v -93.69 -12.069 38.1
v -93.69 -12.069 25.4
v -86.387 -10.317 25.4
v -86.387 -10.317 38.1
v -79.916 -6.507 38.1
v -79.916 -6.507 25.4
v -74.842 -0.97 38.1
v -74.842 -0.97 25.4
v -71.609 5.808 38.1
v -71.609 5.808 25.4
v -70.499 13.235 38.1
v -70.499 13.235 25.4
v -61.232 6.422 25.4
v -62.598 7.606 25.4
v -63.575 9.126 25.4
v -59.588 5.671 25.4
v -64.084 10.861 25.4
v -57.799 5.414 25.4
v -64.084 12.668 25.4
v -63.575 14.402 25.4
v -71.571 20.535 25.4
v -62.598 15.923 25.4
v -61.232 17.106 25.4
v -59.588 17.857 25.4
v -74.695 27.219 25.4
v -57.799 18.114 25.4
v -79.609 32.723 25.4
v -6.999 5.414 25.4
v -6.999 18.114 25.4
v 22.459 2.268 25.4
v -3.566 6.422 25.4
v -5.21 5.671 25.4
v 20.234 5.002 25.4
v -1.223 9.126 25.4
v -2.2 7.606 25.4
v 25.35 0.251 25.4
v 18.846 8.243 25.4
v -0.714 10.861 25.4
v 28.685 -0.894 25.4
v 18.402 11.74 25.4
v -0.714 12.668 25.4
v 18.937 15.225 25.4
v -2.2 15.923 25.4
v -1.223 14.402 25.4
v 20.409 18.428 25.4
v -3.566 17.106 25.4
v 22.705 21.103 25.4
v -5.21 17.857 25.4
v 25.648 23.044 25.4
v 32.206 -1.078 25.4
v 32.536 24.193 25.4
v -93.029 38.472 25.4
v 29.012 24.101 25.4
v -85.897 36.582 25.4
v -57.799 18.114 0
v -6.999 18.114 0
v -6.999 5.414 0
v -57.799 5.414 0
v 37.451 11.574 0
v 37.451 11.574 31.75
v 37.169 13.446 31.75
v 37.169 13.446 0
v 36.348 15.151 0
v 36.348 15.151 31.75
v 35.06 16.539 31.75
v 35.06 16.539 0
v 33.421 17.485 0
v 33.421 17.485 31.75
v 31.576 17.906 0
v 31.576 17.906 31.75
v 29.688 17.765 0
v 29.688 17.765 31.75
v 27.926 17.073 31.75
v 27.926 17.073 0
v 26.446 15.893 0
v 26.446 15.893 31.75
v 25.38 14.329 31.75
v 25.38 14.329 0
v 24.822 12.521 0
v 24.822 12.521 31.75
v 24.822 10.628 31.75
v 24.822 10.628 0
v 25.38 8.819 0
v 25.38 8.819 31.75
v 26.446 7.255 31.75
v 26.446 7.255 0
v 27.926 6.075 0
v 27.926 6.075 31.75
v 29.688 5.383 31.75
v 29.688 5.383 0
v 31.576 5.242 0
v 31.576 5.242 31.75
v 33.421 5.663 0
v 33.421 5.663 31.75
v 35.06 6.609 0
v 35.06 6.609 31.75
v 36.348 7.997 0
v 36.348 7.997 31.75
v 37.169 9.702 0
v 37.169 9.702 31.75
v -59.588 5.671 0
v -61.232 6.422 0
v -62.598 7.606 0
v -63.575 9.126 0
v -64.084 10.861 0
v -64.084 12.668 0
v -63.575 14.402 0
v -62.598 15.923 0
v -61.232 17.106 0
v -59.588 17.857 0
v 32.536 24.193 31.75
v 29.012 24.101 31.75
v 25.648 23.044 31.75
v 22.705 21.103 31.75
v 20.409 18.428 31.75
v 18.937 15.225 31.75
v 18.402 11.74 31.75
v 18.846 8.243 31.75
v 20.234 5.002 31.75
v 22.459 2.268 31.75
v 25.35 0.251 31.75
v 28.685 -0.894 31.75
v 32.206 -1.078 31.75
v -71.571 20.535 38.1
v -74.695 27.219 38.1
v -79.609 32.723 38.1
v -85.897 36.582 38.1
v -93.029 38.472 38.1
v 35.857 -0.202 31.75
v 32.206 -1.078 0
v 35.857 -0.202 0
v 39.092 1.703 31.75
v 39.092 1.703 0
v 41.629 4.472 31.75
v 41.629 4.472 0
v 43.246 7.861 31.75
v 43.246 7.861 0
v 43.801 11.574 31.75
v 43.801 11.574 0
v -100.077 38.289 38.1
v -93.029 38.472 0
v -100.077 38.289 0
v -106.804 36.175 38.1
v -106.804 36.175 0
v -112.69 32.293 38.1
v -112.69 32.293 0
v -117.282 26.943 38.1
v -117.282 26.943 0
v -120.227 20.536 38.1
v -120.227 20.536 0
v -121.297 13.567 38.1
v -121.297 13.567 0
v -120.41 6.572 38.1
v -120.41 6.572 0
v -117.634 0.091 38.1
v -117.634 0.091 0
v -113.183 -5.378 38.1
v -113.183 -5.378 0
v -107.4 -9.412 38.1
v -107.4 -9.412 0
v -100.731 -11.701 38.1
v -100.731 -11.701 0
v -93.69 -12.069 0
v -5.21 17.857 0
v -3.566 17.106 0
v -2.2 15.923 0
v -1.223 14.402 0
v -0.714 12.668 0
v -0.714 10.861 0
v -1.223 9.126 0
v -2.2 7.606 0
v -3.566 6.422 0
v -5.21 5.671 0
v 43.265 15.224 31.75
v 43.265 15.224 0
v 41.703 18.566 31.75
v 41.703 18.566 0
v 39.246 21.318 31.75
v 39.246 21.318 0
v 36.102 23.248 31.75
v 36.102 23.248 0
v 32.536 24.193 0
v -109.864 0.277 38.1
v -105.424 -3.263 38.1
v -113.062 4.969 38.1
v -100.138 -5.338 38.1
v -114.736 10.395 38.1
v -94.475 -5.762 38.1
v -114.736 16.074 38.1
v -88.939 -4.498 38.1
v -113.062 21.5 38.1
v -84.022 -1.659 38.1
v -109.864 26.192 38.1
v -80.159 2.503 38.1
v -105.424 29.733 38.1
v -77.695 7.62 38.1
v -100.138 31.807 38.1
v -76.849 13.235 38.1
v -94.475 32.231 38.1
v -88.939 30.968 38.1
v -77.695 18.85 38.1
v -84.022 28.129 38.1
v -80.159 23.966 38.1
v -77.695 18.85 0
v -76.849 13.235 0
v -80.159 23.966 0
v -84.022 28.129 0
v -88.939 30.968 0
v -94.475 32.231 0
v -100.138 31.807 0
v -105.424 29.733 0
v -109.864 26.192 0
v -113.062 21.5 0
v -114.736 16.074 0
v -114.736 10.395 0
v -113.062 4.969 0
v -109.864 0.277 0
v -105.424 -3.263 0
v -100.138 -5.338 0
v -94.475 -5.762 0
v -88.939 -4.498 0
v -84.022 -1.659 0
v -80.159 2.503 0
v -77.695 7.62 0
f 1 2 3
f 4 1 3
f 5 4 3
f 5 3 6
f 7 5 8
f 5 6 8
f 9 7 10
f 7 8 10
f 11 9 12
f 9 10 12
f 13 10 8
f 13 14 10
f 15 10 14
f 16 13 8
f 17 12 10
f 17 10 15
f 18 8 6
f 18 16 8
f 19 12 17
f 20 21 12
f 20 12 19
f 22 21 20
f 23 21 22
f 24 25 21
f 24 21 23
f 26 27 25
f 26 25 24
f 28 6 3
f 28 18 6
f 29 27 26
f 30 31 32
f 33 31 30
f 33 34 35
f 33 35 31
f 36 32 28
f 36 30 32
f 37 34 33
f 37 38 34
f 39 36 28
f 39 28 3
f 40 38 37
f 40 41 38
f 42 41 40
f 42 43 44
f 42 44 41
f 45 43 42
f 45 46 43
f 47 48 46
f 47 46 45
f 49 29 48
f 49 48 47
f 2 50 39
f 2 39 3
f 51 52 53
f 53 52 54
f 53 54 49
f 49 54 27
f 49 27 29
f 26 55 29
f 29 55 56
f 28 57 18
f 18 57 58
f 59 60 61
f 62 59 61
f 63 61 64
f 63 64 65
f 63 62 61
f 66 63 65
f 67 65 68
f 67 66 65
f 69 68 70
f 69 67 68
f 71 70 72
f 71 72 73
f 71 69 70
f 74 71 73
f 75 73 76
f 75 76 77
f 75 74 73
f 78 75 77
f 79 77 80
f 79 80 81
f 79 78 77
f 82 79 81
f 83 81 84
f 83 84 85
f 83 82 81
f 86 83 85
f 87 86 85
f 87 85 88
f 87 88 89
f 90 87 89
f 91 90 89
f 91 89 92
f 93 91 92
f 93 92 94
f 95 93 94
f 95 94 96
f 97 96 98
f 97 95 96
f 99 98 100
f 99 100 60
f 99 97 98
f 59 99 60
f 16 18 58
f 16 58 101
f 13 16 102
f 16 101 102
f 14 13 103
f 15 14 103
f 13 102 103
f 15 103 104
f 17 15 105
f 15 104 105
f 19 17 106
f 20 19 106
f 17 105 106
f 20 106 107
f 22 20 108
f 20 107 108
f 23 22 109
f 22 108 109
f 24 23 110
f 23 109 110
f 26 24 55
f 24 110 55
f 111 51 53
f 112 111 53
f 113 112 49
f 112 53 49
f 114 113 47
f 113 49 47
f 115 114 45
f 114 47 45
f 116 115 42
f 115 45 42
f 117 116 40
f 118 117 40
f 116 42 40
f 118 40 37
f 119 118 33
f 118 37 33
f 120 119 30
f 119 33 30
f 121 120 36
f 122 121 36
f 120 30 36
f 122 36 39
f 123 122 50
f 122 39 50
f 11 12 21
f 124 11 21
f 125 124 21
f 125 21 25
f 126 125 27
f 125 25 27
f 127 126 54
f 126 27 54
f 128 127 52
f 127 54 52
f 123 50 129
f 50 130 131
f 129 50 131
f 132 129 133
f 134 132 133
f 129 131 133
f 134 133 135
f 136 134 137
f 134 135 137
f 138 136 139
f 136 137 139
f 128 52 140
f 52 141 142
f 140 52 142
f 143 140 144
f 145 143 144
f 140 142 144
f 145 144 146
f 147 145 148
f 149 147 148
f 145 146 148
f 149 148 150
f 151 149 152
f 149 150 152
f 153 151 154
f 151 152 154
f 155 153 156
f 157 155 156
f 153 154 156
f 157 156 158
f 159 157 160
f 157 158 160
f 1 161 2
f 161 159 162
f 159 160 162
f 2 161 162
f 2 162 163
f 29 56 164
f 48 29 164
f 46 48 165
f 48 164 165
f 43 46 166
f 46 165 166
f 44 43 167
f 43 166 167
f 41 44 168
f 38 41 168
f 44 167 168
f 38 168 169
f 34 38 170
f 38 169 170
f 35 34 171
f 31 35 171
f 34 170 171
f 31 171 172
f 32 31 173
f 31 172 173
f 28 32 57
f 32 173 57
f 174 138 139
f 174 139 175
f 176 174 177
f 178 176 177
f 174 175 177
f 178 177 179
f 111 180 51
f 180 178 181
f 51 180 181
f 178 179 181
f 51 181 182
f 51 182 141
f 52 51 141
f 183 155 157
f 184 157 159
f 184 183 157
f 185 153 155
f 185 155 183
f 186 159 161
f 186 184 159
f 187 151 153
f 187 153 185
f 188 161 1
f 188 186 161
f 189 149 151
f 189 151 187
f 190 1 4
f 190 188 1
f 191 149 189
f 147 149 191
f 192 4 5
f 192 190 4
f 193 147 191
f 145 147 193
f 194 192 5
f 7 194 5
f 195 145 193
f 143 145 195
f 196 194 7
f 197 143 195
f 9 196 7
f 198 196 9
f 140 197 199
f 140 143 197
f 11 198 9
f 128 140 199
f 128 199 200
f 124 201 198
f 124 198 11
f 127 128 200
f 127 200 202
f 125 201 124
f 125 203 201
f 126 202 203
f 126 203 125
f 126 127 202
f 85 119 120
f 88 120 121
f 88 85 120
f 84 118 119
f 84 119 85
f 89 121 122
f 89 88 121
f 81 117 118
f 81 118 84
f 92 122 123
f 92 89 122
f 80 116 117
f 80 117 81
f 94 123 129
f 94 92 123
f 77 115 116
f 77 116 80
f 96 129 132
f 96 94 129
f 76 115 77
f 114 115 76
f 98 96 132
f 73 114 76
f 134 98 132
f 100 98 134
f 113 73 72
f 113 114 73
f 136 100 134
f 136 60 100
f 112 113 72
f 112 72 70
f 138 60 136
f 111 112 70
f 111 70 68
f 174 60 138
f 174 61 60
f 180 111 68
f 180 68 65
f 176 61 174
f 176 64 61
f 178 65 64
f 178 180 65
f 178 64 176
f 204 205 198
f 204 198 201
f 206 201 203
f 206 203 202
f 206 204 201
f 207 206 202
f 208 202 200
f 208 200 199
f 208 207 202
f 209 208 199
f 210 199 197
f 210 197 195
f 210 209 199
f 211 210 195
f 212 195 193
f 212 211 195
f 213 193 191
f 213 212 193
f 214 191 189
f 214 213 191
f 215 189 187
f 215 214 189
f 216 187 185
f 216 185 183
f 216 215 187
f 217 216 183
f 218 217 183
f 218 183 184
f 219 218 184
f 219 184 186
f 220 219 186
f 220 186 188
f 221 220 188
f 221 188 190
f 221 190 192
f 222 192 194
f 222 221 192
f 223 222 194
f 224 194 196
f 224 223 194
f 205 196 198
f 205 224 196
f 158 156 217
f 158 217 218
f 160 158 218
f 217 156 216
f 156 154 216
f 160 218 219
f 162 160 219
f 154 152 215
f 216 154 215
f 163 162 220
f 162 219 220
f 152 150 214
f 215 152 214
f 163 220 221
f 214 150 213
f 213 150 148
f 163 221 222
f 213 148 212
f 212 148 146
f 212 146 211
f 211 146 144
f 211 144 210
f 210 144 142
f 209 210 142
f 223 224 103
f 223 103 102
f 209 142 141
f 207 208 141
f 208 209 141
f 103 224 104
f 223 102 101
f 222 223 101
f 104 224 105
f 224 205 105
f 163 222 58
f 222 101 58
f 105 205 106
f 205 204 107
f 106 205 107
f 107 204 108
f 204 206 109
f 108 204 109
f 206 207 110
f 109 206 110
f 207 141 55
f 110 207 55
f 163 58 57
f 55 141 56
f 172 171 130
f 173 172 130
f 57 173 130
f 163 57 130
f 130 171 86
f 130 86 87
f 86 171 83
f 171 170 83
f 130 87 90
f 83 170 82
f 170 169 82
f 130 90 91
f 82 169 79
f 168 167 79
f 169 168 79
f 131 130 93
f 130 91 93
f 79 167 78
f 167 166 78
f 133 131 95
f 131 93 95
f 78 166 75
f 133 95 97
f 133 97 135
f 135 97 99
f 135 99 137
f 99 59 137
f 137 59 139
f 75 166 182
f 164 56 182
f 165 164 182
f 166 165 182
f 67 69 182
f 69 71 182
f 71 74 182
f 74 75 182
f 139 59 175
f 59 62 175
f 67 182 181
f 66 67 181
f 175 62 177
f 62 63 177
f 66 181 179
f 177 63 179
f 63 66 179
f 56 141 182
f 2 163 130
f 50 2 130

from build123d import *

# Parameters (mm, degrees)
F0_R     = 19.05
F1_DEPTH = 38.1
F0_R_2   = 6.35
F2_DEPTH = 31.75
F3_DEPTH = 25.4


with BuildPart() as f1:
    # F0 (on Top) → F1 (new body)
    with BuildSketch(Plane.XY):
        with BuildLine():
            ThreePointArc((-93.689878, -12.069013), (-77.173734, -3.926966), (-70.499011, 13.234736))
            ThreePointArc((-70.499011, 13.234736), (-76.950951, 30.150144), (-93.029012, 38.472072))
            ThreePointArc((-93.029012, 38.472072), (-121.29684, 13.566834), (-93.689878, -12.069013))
        make_face()
        with Locations((-95.899011, 13.234736)):
            Circle(F0_R, mode=Mode.SUBTRACT)
    extrude(amount=F1_DEPTH)



with BuildPart() as f2:
    # F0 (on Top) → F2 (new body)
    with BuildSketch(Plane.XY):
        with BuildLine():
            ThreePointArc((43.800989, 11.574107), (40.575019, 20.031811), (32.535988, 24.192775))
            ThreePointArc((32.535988, 24.192775), (18.402075, 11.740156), (32.205555, -1.077768))
            ThreePointArc((32.205555, -1.077768), (40.463627, 2.993256), (43.800989, 11.574107))
        make_face()
        with Locations((31.100989, 11.574107)):
            Circle(F0_R_2, mode=Mode.SUBTRACT)
    extrude(amount=F2_DEPTH)


with BuildPart() as f1_1:
    add(f1.part)

    add(f2.part)  # F3 merges F2
    # F0 (on Top) → F3 (join)
    with BuildSketch(Plane.XY):
        with BuildLine():
            ThreePointArc((-93.029012, 38.472072), (-76.950951, 30.150144), (-70.499011, 13.234736))
            ThreePointArc((-70.499011, 13.234736), (-77.173734, -3.926966), (-93.689878, -12.069013))
            Line((-93.689878, -12.069013), (32.205555, -1.077768))
            ThreePointArc((32.205555, -1.077768), (18.402075, 11.740156), (32.535988, 24.192775))
            Line((32.535988, 24.192775), (-93.029012, 38.472072))
        make_face()
        with BuildLine():
            ThreePointArc((-57.799011, 5.414211), (-64.149011, 11.764211), (-57.799011, 18.114211))
            Line((-57.799011, 18.114211), (-6.999011, 18.114211))
            ThreePointArc((-6.999011, 18.114211), (-0.649011, 11.764211), (-6.999011, 5.414211))
            Line((-6.999011, 5.414211), (-57.799011, 5.414211))
        make_face(mode=Mode.SUBTRACT)
    extrude(amount=F3_DEPTH)


solid = f1_1.part
